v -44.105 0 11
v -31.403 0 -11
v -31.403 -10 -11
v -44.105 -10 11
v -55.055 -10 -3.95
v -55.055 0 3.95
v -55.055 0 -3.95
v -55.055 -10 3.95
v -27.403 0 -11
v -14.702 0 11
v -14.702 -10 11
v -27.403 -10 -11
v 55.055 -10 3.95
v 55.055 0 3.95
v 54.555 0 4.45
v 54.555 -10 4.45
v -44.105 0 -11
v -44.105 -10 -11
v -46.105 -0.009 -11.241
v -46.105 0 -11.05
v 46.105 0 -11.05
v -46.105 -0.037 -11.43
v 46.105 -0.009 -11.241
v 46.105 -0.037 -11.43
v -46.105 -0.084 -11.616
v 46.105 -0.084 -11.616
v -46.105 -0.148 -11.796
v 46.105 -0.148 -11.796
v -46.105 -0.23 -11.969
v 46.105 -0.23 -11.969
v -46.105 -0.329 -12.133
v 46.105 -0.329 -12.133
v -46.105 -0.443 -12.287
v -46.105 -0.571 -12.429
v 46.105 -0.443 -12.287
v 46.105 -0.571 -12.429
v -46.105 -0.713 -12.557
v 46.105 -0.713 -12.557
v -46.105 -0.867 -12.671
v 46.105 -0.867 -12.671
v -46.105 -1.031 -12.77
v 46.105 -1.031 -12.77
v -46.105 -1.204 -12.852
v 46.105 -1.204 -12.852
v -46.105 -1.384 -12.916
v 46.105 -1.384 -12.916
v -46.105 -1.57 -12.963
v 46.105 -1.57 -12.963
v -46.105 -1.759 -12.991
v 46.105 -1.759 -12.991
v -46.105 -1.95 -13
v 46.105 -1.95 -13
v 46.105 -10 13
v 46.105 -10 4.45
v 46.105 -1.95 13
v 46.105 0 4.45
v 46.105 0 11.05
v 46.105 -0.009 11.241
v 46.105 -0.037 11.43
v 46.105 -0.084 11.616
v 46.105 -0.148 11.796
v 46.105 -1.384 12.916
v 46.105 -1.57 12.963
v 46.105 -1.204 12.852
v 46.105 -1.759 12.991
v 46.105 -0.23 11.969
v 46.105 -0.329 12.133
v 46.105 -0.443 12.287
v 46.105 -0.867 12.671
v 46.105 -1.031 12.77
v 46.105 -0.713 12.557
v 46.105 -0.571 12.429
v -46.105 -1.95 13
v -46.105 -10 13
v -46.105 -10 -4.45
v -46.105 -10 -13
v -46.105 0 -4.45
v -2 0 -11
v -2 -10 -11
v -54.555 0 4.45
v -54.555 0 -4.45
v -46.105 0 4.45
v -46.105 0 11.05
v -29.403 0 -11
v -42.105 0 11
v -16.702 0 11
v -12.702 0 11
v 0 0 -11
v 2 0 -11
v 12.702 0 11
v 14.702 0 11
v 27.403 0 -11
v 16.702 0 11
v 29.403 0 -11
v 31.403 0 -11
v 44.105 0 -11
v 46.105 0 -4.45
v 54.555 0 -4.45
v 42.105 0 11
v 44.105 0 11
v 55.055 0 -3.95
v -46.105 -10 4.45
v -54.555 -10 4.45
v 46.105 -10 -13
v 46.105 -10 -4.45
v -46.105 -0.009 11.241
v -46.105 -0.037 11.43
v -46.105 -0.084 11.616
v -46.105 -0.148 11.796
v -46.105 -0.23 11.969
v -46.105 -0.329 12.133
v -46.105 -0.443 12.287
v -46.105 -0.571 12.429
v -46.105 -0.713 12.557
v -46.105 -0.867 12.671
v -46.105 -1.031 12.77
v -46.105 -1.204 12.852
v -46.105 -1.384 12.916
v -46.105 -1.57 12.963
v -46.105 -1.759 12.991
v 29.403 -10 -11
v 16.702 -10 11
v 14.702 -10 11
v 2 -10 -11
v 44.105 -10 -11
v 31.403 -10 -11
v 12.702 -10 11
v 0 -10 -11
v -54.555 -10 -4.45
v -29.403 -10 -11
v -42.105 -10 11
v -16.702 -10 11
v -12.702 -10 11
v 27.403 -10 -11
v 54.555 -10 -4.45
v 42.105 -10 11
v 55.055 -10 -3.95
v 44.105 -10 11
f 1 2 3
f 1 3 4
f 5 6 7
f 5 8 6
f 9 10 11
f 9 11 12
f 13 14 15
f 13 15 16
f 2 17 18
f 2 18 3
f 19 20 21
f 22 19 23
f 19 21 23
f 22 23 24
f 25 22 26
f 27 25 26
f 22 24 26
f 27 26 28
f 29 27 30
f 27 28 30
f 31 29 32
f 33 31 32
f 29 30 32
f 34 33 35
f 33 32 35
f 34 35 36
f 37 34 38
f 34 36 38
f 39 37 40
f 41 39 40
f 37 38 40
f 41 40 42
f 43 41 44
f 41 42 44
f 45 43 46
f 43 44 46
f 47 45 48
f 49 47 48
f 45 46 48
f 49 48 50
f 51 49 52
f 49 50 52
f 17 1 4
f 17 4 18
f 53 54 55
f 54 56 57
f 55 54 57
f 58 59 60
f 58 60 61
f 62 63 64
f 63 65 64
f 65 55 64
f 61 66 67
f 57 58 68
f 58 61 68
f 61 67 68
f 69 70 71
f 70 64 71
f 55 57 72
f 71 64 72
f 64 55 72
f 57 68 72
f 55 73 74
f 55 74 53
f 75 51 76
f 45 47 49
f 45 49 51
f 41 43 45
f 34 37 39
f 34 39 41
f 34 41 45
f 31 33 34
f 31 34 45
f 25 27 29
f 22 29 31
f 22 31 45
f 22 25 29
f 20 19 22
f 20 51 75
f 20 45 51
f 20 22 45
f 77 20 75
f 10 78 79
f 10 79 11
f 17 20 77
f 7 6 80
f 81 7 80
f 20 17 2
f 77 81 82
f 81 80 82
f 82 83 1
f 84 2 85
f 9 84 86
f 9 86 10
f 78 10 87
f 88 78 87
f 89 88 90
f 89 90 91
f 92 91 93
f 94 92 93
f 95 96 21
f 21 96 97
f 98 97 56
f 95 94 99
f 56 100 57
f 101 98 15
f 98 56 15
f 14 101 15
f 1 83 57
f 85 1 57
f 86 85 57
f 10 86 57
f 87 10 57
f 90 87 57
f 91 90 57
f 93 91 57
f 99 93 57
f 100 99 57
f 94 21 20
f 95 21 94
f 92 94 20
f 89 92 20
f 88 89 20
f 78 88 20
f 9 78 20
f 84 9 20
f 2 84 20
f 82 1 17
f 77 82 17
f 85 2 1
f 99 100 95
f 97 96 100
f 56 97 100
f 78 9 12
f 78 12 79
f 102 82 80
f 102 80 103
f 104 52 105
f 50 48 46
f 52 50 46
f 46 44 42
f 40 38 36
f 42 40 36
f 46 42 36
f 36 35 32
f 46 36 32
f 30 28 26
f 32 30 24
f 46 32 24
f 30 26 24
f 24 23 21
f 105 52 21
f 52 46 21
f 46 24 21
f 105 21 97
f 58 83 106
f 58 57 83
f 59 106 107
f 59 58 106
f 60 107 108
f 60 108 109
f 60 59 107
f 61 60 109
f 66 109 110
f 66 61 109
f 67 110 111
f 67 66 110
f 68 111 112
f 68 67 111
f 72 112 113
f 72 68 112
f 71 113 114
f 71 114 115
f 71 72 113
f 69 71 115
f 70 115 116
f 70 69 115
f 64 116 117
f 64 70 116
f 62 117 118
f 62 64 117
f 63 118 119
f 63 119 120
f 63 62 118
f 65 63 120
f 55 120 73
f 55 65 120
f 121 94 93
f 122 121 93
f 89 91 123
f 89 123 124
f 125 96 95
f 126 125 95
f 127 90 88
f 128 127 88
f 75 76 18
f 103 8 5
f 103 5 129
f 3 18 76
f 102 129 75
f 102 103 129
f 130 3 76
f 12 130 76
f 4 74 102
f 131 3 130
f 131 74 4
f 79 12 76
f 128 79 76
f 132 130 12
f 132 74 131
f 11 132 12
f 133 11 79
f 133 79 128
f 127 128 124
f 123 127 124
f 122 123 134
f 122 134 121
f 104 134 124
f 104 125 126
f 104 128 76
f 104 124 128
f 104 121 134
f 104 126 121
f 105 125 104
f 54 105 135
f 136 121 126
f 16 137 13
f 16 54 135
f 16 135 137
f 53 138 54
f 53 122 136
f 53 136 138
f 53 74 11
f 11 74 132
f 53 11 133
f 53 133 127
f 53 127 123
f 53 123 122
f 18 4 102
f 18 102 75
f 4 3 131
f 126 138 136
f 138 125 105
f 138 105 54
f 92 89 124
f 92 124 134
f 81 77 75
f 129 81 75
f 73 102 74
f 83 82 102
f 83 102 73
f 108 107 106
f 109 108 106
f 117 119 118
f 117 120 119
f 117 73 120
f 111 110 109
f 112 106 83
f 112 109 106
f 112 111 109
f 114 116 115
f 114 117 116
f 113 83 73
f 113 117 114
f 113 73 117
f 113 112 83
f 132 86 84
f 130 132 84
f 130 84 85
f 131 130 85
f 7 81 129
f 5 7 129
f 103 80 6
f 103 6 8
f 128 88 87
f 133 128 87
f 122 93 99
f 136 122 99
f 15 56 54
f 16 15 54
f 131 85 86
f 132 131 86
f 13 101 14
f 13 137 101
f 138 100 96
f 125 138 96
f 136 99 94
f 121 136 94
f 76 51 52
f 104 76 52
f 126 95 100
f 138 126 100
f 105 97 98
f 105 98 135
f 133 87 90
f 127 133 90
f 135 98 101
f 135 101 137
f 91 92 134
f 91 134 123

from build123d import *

# Parameters (mm, degrees)
SKETCH_W        = 92.210236
SKETCH_H        = 26
PAD_DEPTH       = 10
SKETCH001_W     = 8.9
SKETCH001_H     = 10
PAD001_DEPTH    = 8.95
CHAMFER_SIZE    = 0.5
CHAMFER001_SIZE = 0.5
SKETCH002_W     = 8.9
SKETCH002_H     = 10
PAD002_DEPTH    = 8.95
CHAMFER002_SIZE = 0.5
CHAMFER003_SIZE = 0.5
FILLET_R        = 1.95
FILLET001_R     = 1.95


with BuildPart() as part:
    # Sketch → Pad (new body)
    with BuildSketch(Plane.XZ):
        Rectangle(SKETCH_W, SKETCH_H)
        Polygon((-44.105118, 11), (-44.105118, -11), (-31.403412, -11), align=None, mode=Mode.SUBTRACT)
        Polygon((-29.403412, -11), (-42.105118, 11), (-16.701706, 11), align=None, mode=Mode.SUBTRACT)
        Polygon((-14.701706, 11), (-27.403412, -11), (-2, -11), align=None, mode=Mode.SUBTRACT)
        Polygon((-12.701706, 11), (12.701706, 11), (0, -11), align=None, mode=Mode.SUBTRACT)
        Polygon((14.701706, 11), (2, -11), (27.403412, -11), align=None, mode=Mode.SUBTRACT)
        Polygon((16.701706, 11), (42.105118, 11), (29.403412, -11), align=None, mode=Mode.SUBTRACT)
        Polygon((44.105118, 11), (44.105118, -11), (31.403412, -11), align=None, mode=Mode.SUBTRACT)
    extrude(amount=PAD_DEPTH)

    # Sketch001 (on Face4 of Pad) → Pad001 (join)
    with BuildSketch(Plane(origin=(-46.105118, 0, 0), x_dir=(0, 0, -1), z_dir=(-1, 0, 0))):
        with Locations((0, 5)):
            Rectangle(SKETCH001_W, SKETCH001_H)
    extrude(amount=PAD001_DEPTH)

    # Chamfer
    chamfer_edges = [part.edges().sort_by_distance(p)[0] for p in [
        (-55.055118, -5, 4.45),
    ]]
    chamfer(chamfer_edges, length=CHAMFER_SIZE)

    # Chamfer001
    chamfer001_edges = [part.edges().sort_by_distance(p)[0] for p in [
        (-55.055118, -5, -4.45),
    ]]
    chamfer(chamfer001_edges, length=CHAMFER001_SIZE)

    # Sketch002 (on Face12 of Chamfer001) → Pad002 (join)
    with BuildSketch(Plane(origin=(46.105118, 0, 0), x_dir=(0, 0, 1), z_dir=(1, 0, 0))):
        with Locations((0, 5)):
            Rectangle(SKETCH002_W, SKETCH002_H)
    extrude(amount=PAD002_DEPTH)

    # Chamfer002
    chamfer002_edges = [part.edges().sort_by_distance(p)[0] for p in [
        (55.055118, -5, 4.45),
    ]]
    chamfer(chamfer002_edges, length=CHAMFER002_SIZE)

    # Chamfer003
    chamfer003_edges = [part.edges().sort_by_distance(p)[0] for p in [
        (55.055118, -5, -4.45),
    ]]
    chamfer(chamfer003_edges, length=CHAMFER003_SIZE)

    # Fillet
    fillet_edges = [part.edges().sort_by_distance(p)[0] for p in [
        (0, 0, 13),
    ]]
    fillet(fillet_edges, radius=FILLET_R)

    # Fillet001
    fillet001_edges = [part.edges().sort_by_distance(p)[0] for p in [
        (0, 0, -13),
    ]]
    fillet(fillet001_edges, radius=FILLET001_R)


solid = part.part
